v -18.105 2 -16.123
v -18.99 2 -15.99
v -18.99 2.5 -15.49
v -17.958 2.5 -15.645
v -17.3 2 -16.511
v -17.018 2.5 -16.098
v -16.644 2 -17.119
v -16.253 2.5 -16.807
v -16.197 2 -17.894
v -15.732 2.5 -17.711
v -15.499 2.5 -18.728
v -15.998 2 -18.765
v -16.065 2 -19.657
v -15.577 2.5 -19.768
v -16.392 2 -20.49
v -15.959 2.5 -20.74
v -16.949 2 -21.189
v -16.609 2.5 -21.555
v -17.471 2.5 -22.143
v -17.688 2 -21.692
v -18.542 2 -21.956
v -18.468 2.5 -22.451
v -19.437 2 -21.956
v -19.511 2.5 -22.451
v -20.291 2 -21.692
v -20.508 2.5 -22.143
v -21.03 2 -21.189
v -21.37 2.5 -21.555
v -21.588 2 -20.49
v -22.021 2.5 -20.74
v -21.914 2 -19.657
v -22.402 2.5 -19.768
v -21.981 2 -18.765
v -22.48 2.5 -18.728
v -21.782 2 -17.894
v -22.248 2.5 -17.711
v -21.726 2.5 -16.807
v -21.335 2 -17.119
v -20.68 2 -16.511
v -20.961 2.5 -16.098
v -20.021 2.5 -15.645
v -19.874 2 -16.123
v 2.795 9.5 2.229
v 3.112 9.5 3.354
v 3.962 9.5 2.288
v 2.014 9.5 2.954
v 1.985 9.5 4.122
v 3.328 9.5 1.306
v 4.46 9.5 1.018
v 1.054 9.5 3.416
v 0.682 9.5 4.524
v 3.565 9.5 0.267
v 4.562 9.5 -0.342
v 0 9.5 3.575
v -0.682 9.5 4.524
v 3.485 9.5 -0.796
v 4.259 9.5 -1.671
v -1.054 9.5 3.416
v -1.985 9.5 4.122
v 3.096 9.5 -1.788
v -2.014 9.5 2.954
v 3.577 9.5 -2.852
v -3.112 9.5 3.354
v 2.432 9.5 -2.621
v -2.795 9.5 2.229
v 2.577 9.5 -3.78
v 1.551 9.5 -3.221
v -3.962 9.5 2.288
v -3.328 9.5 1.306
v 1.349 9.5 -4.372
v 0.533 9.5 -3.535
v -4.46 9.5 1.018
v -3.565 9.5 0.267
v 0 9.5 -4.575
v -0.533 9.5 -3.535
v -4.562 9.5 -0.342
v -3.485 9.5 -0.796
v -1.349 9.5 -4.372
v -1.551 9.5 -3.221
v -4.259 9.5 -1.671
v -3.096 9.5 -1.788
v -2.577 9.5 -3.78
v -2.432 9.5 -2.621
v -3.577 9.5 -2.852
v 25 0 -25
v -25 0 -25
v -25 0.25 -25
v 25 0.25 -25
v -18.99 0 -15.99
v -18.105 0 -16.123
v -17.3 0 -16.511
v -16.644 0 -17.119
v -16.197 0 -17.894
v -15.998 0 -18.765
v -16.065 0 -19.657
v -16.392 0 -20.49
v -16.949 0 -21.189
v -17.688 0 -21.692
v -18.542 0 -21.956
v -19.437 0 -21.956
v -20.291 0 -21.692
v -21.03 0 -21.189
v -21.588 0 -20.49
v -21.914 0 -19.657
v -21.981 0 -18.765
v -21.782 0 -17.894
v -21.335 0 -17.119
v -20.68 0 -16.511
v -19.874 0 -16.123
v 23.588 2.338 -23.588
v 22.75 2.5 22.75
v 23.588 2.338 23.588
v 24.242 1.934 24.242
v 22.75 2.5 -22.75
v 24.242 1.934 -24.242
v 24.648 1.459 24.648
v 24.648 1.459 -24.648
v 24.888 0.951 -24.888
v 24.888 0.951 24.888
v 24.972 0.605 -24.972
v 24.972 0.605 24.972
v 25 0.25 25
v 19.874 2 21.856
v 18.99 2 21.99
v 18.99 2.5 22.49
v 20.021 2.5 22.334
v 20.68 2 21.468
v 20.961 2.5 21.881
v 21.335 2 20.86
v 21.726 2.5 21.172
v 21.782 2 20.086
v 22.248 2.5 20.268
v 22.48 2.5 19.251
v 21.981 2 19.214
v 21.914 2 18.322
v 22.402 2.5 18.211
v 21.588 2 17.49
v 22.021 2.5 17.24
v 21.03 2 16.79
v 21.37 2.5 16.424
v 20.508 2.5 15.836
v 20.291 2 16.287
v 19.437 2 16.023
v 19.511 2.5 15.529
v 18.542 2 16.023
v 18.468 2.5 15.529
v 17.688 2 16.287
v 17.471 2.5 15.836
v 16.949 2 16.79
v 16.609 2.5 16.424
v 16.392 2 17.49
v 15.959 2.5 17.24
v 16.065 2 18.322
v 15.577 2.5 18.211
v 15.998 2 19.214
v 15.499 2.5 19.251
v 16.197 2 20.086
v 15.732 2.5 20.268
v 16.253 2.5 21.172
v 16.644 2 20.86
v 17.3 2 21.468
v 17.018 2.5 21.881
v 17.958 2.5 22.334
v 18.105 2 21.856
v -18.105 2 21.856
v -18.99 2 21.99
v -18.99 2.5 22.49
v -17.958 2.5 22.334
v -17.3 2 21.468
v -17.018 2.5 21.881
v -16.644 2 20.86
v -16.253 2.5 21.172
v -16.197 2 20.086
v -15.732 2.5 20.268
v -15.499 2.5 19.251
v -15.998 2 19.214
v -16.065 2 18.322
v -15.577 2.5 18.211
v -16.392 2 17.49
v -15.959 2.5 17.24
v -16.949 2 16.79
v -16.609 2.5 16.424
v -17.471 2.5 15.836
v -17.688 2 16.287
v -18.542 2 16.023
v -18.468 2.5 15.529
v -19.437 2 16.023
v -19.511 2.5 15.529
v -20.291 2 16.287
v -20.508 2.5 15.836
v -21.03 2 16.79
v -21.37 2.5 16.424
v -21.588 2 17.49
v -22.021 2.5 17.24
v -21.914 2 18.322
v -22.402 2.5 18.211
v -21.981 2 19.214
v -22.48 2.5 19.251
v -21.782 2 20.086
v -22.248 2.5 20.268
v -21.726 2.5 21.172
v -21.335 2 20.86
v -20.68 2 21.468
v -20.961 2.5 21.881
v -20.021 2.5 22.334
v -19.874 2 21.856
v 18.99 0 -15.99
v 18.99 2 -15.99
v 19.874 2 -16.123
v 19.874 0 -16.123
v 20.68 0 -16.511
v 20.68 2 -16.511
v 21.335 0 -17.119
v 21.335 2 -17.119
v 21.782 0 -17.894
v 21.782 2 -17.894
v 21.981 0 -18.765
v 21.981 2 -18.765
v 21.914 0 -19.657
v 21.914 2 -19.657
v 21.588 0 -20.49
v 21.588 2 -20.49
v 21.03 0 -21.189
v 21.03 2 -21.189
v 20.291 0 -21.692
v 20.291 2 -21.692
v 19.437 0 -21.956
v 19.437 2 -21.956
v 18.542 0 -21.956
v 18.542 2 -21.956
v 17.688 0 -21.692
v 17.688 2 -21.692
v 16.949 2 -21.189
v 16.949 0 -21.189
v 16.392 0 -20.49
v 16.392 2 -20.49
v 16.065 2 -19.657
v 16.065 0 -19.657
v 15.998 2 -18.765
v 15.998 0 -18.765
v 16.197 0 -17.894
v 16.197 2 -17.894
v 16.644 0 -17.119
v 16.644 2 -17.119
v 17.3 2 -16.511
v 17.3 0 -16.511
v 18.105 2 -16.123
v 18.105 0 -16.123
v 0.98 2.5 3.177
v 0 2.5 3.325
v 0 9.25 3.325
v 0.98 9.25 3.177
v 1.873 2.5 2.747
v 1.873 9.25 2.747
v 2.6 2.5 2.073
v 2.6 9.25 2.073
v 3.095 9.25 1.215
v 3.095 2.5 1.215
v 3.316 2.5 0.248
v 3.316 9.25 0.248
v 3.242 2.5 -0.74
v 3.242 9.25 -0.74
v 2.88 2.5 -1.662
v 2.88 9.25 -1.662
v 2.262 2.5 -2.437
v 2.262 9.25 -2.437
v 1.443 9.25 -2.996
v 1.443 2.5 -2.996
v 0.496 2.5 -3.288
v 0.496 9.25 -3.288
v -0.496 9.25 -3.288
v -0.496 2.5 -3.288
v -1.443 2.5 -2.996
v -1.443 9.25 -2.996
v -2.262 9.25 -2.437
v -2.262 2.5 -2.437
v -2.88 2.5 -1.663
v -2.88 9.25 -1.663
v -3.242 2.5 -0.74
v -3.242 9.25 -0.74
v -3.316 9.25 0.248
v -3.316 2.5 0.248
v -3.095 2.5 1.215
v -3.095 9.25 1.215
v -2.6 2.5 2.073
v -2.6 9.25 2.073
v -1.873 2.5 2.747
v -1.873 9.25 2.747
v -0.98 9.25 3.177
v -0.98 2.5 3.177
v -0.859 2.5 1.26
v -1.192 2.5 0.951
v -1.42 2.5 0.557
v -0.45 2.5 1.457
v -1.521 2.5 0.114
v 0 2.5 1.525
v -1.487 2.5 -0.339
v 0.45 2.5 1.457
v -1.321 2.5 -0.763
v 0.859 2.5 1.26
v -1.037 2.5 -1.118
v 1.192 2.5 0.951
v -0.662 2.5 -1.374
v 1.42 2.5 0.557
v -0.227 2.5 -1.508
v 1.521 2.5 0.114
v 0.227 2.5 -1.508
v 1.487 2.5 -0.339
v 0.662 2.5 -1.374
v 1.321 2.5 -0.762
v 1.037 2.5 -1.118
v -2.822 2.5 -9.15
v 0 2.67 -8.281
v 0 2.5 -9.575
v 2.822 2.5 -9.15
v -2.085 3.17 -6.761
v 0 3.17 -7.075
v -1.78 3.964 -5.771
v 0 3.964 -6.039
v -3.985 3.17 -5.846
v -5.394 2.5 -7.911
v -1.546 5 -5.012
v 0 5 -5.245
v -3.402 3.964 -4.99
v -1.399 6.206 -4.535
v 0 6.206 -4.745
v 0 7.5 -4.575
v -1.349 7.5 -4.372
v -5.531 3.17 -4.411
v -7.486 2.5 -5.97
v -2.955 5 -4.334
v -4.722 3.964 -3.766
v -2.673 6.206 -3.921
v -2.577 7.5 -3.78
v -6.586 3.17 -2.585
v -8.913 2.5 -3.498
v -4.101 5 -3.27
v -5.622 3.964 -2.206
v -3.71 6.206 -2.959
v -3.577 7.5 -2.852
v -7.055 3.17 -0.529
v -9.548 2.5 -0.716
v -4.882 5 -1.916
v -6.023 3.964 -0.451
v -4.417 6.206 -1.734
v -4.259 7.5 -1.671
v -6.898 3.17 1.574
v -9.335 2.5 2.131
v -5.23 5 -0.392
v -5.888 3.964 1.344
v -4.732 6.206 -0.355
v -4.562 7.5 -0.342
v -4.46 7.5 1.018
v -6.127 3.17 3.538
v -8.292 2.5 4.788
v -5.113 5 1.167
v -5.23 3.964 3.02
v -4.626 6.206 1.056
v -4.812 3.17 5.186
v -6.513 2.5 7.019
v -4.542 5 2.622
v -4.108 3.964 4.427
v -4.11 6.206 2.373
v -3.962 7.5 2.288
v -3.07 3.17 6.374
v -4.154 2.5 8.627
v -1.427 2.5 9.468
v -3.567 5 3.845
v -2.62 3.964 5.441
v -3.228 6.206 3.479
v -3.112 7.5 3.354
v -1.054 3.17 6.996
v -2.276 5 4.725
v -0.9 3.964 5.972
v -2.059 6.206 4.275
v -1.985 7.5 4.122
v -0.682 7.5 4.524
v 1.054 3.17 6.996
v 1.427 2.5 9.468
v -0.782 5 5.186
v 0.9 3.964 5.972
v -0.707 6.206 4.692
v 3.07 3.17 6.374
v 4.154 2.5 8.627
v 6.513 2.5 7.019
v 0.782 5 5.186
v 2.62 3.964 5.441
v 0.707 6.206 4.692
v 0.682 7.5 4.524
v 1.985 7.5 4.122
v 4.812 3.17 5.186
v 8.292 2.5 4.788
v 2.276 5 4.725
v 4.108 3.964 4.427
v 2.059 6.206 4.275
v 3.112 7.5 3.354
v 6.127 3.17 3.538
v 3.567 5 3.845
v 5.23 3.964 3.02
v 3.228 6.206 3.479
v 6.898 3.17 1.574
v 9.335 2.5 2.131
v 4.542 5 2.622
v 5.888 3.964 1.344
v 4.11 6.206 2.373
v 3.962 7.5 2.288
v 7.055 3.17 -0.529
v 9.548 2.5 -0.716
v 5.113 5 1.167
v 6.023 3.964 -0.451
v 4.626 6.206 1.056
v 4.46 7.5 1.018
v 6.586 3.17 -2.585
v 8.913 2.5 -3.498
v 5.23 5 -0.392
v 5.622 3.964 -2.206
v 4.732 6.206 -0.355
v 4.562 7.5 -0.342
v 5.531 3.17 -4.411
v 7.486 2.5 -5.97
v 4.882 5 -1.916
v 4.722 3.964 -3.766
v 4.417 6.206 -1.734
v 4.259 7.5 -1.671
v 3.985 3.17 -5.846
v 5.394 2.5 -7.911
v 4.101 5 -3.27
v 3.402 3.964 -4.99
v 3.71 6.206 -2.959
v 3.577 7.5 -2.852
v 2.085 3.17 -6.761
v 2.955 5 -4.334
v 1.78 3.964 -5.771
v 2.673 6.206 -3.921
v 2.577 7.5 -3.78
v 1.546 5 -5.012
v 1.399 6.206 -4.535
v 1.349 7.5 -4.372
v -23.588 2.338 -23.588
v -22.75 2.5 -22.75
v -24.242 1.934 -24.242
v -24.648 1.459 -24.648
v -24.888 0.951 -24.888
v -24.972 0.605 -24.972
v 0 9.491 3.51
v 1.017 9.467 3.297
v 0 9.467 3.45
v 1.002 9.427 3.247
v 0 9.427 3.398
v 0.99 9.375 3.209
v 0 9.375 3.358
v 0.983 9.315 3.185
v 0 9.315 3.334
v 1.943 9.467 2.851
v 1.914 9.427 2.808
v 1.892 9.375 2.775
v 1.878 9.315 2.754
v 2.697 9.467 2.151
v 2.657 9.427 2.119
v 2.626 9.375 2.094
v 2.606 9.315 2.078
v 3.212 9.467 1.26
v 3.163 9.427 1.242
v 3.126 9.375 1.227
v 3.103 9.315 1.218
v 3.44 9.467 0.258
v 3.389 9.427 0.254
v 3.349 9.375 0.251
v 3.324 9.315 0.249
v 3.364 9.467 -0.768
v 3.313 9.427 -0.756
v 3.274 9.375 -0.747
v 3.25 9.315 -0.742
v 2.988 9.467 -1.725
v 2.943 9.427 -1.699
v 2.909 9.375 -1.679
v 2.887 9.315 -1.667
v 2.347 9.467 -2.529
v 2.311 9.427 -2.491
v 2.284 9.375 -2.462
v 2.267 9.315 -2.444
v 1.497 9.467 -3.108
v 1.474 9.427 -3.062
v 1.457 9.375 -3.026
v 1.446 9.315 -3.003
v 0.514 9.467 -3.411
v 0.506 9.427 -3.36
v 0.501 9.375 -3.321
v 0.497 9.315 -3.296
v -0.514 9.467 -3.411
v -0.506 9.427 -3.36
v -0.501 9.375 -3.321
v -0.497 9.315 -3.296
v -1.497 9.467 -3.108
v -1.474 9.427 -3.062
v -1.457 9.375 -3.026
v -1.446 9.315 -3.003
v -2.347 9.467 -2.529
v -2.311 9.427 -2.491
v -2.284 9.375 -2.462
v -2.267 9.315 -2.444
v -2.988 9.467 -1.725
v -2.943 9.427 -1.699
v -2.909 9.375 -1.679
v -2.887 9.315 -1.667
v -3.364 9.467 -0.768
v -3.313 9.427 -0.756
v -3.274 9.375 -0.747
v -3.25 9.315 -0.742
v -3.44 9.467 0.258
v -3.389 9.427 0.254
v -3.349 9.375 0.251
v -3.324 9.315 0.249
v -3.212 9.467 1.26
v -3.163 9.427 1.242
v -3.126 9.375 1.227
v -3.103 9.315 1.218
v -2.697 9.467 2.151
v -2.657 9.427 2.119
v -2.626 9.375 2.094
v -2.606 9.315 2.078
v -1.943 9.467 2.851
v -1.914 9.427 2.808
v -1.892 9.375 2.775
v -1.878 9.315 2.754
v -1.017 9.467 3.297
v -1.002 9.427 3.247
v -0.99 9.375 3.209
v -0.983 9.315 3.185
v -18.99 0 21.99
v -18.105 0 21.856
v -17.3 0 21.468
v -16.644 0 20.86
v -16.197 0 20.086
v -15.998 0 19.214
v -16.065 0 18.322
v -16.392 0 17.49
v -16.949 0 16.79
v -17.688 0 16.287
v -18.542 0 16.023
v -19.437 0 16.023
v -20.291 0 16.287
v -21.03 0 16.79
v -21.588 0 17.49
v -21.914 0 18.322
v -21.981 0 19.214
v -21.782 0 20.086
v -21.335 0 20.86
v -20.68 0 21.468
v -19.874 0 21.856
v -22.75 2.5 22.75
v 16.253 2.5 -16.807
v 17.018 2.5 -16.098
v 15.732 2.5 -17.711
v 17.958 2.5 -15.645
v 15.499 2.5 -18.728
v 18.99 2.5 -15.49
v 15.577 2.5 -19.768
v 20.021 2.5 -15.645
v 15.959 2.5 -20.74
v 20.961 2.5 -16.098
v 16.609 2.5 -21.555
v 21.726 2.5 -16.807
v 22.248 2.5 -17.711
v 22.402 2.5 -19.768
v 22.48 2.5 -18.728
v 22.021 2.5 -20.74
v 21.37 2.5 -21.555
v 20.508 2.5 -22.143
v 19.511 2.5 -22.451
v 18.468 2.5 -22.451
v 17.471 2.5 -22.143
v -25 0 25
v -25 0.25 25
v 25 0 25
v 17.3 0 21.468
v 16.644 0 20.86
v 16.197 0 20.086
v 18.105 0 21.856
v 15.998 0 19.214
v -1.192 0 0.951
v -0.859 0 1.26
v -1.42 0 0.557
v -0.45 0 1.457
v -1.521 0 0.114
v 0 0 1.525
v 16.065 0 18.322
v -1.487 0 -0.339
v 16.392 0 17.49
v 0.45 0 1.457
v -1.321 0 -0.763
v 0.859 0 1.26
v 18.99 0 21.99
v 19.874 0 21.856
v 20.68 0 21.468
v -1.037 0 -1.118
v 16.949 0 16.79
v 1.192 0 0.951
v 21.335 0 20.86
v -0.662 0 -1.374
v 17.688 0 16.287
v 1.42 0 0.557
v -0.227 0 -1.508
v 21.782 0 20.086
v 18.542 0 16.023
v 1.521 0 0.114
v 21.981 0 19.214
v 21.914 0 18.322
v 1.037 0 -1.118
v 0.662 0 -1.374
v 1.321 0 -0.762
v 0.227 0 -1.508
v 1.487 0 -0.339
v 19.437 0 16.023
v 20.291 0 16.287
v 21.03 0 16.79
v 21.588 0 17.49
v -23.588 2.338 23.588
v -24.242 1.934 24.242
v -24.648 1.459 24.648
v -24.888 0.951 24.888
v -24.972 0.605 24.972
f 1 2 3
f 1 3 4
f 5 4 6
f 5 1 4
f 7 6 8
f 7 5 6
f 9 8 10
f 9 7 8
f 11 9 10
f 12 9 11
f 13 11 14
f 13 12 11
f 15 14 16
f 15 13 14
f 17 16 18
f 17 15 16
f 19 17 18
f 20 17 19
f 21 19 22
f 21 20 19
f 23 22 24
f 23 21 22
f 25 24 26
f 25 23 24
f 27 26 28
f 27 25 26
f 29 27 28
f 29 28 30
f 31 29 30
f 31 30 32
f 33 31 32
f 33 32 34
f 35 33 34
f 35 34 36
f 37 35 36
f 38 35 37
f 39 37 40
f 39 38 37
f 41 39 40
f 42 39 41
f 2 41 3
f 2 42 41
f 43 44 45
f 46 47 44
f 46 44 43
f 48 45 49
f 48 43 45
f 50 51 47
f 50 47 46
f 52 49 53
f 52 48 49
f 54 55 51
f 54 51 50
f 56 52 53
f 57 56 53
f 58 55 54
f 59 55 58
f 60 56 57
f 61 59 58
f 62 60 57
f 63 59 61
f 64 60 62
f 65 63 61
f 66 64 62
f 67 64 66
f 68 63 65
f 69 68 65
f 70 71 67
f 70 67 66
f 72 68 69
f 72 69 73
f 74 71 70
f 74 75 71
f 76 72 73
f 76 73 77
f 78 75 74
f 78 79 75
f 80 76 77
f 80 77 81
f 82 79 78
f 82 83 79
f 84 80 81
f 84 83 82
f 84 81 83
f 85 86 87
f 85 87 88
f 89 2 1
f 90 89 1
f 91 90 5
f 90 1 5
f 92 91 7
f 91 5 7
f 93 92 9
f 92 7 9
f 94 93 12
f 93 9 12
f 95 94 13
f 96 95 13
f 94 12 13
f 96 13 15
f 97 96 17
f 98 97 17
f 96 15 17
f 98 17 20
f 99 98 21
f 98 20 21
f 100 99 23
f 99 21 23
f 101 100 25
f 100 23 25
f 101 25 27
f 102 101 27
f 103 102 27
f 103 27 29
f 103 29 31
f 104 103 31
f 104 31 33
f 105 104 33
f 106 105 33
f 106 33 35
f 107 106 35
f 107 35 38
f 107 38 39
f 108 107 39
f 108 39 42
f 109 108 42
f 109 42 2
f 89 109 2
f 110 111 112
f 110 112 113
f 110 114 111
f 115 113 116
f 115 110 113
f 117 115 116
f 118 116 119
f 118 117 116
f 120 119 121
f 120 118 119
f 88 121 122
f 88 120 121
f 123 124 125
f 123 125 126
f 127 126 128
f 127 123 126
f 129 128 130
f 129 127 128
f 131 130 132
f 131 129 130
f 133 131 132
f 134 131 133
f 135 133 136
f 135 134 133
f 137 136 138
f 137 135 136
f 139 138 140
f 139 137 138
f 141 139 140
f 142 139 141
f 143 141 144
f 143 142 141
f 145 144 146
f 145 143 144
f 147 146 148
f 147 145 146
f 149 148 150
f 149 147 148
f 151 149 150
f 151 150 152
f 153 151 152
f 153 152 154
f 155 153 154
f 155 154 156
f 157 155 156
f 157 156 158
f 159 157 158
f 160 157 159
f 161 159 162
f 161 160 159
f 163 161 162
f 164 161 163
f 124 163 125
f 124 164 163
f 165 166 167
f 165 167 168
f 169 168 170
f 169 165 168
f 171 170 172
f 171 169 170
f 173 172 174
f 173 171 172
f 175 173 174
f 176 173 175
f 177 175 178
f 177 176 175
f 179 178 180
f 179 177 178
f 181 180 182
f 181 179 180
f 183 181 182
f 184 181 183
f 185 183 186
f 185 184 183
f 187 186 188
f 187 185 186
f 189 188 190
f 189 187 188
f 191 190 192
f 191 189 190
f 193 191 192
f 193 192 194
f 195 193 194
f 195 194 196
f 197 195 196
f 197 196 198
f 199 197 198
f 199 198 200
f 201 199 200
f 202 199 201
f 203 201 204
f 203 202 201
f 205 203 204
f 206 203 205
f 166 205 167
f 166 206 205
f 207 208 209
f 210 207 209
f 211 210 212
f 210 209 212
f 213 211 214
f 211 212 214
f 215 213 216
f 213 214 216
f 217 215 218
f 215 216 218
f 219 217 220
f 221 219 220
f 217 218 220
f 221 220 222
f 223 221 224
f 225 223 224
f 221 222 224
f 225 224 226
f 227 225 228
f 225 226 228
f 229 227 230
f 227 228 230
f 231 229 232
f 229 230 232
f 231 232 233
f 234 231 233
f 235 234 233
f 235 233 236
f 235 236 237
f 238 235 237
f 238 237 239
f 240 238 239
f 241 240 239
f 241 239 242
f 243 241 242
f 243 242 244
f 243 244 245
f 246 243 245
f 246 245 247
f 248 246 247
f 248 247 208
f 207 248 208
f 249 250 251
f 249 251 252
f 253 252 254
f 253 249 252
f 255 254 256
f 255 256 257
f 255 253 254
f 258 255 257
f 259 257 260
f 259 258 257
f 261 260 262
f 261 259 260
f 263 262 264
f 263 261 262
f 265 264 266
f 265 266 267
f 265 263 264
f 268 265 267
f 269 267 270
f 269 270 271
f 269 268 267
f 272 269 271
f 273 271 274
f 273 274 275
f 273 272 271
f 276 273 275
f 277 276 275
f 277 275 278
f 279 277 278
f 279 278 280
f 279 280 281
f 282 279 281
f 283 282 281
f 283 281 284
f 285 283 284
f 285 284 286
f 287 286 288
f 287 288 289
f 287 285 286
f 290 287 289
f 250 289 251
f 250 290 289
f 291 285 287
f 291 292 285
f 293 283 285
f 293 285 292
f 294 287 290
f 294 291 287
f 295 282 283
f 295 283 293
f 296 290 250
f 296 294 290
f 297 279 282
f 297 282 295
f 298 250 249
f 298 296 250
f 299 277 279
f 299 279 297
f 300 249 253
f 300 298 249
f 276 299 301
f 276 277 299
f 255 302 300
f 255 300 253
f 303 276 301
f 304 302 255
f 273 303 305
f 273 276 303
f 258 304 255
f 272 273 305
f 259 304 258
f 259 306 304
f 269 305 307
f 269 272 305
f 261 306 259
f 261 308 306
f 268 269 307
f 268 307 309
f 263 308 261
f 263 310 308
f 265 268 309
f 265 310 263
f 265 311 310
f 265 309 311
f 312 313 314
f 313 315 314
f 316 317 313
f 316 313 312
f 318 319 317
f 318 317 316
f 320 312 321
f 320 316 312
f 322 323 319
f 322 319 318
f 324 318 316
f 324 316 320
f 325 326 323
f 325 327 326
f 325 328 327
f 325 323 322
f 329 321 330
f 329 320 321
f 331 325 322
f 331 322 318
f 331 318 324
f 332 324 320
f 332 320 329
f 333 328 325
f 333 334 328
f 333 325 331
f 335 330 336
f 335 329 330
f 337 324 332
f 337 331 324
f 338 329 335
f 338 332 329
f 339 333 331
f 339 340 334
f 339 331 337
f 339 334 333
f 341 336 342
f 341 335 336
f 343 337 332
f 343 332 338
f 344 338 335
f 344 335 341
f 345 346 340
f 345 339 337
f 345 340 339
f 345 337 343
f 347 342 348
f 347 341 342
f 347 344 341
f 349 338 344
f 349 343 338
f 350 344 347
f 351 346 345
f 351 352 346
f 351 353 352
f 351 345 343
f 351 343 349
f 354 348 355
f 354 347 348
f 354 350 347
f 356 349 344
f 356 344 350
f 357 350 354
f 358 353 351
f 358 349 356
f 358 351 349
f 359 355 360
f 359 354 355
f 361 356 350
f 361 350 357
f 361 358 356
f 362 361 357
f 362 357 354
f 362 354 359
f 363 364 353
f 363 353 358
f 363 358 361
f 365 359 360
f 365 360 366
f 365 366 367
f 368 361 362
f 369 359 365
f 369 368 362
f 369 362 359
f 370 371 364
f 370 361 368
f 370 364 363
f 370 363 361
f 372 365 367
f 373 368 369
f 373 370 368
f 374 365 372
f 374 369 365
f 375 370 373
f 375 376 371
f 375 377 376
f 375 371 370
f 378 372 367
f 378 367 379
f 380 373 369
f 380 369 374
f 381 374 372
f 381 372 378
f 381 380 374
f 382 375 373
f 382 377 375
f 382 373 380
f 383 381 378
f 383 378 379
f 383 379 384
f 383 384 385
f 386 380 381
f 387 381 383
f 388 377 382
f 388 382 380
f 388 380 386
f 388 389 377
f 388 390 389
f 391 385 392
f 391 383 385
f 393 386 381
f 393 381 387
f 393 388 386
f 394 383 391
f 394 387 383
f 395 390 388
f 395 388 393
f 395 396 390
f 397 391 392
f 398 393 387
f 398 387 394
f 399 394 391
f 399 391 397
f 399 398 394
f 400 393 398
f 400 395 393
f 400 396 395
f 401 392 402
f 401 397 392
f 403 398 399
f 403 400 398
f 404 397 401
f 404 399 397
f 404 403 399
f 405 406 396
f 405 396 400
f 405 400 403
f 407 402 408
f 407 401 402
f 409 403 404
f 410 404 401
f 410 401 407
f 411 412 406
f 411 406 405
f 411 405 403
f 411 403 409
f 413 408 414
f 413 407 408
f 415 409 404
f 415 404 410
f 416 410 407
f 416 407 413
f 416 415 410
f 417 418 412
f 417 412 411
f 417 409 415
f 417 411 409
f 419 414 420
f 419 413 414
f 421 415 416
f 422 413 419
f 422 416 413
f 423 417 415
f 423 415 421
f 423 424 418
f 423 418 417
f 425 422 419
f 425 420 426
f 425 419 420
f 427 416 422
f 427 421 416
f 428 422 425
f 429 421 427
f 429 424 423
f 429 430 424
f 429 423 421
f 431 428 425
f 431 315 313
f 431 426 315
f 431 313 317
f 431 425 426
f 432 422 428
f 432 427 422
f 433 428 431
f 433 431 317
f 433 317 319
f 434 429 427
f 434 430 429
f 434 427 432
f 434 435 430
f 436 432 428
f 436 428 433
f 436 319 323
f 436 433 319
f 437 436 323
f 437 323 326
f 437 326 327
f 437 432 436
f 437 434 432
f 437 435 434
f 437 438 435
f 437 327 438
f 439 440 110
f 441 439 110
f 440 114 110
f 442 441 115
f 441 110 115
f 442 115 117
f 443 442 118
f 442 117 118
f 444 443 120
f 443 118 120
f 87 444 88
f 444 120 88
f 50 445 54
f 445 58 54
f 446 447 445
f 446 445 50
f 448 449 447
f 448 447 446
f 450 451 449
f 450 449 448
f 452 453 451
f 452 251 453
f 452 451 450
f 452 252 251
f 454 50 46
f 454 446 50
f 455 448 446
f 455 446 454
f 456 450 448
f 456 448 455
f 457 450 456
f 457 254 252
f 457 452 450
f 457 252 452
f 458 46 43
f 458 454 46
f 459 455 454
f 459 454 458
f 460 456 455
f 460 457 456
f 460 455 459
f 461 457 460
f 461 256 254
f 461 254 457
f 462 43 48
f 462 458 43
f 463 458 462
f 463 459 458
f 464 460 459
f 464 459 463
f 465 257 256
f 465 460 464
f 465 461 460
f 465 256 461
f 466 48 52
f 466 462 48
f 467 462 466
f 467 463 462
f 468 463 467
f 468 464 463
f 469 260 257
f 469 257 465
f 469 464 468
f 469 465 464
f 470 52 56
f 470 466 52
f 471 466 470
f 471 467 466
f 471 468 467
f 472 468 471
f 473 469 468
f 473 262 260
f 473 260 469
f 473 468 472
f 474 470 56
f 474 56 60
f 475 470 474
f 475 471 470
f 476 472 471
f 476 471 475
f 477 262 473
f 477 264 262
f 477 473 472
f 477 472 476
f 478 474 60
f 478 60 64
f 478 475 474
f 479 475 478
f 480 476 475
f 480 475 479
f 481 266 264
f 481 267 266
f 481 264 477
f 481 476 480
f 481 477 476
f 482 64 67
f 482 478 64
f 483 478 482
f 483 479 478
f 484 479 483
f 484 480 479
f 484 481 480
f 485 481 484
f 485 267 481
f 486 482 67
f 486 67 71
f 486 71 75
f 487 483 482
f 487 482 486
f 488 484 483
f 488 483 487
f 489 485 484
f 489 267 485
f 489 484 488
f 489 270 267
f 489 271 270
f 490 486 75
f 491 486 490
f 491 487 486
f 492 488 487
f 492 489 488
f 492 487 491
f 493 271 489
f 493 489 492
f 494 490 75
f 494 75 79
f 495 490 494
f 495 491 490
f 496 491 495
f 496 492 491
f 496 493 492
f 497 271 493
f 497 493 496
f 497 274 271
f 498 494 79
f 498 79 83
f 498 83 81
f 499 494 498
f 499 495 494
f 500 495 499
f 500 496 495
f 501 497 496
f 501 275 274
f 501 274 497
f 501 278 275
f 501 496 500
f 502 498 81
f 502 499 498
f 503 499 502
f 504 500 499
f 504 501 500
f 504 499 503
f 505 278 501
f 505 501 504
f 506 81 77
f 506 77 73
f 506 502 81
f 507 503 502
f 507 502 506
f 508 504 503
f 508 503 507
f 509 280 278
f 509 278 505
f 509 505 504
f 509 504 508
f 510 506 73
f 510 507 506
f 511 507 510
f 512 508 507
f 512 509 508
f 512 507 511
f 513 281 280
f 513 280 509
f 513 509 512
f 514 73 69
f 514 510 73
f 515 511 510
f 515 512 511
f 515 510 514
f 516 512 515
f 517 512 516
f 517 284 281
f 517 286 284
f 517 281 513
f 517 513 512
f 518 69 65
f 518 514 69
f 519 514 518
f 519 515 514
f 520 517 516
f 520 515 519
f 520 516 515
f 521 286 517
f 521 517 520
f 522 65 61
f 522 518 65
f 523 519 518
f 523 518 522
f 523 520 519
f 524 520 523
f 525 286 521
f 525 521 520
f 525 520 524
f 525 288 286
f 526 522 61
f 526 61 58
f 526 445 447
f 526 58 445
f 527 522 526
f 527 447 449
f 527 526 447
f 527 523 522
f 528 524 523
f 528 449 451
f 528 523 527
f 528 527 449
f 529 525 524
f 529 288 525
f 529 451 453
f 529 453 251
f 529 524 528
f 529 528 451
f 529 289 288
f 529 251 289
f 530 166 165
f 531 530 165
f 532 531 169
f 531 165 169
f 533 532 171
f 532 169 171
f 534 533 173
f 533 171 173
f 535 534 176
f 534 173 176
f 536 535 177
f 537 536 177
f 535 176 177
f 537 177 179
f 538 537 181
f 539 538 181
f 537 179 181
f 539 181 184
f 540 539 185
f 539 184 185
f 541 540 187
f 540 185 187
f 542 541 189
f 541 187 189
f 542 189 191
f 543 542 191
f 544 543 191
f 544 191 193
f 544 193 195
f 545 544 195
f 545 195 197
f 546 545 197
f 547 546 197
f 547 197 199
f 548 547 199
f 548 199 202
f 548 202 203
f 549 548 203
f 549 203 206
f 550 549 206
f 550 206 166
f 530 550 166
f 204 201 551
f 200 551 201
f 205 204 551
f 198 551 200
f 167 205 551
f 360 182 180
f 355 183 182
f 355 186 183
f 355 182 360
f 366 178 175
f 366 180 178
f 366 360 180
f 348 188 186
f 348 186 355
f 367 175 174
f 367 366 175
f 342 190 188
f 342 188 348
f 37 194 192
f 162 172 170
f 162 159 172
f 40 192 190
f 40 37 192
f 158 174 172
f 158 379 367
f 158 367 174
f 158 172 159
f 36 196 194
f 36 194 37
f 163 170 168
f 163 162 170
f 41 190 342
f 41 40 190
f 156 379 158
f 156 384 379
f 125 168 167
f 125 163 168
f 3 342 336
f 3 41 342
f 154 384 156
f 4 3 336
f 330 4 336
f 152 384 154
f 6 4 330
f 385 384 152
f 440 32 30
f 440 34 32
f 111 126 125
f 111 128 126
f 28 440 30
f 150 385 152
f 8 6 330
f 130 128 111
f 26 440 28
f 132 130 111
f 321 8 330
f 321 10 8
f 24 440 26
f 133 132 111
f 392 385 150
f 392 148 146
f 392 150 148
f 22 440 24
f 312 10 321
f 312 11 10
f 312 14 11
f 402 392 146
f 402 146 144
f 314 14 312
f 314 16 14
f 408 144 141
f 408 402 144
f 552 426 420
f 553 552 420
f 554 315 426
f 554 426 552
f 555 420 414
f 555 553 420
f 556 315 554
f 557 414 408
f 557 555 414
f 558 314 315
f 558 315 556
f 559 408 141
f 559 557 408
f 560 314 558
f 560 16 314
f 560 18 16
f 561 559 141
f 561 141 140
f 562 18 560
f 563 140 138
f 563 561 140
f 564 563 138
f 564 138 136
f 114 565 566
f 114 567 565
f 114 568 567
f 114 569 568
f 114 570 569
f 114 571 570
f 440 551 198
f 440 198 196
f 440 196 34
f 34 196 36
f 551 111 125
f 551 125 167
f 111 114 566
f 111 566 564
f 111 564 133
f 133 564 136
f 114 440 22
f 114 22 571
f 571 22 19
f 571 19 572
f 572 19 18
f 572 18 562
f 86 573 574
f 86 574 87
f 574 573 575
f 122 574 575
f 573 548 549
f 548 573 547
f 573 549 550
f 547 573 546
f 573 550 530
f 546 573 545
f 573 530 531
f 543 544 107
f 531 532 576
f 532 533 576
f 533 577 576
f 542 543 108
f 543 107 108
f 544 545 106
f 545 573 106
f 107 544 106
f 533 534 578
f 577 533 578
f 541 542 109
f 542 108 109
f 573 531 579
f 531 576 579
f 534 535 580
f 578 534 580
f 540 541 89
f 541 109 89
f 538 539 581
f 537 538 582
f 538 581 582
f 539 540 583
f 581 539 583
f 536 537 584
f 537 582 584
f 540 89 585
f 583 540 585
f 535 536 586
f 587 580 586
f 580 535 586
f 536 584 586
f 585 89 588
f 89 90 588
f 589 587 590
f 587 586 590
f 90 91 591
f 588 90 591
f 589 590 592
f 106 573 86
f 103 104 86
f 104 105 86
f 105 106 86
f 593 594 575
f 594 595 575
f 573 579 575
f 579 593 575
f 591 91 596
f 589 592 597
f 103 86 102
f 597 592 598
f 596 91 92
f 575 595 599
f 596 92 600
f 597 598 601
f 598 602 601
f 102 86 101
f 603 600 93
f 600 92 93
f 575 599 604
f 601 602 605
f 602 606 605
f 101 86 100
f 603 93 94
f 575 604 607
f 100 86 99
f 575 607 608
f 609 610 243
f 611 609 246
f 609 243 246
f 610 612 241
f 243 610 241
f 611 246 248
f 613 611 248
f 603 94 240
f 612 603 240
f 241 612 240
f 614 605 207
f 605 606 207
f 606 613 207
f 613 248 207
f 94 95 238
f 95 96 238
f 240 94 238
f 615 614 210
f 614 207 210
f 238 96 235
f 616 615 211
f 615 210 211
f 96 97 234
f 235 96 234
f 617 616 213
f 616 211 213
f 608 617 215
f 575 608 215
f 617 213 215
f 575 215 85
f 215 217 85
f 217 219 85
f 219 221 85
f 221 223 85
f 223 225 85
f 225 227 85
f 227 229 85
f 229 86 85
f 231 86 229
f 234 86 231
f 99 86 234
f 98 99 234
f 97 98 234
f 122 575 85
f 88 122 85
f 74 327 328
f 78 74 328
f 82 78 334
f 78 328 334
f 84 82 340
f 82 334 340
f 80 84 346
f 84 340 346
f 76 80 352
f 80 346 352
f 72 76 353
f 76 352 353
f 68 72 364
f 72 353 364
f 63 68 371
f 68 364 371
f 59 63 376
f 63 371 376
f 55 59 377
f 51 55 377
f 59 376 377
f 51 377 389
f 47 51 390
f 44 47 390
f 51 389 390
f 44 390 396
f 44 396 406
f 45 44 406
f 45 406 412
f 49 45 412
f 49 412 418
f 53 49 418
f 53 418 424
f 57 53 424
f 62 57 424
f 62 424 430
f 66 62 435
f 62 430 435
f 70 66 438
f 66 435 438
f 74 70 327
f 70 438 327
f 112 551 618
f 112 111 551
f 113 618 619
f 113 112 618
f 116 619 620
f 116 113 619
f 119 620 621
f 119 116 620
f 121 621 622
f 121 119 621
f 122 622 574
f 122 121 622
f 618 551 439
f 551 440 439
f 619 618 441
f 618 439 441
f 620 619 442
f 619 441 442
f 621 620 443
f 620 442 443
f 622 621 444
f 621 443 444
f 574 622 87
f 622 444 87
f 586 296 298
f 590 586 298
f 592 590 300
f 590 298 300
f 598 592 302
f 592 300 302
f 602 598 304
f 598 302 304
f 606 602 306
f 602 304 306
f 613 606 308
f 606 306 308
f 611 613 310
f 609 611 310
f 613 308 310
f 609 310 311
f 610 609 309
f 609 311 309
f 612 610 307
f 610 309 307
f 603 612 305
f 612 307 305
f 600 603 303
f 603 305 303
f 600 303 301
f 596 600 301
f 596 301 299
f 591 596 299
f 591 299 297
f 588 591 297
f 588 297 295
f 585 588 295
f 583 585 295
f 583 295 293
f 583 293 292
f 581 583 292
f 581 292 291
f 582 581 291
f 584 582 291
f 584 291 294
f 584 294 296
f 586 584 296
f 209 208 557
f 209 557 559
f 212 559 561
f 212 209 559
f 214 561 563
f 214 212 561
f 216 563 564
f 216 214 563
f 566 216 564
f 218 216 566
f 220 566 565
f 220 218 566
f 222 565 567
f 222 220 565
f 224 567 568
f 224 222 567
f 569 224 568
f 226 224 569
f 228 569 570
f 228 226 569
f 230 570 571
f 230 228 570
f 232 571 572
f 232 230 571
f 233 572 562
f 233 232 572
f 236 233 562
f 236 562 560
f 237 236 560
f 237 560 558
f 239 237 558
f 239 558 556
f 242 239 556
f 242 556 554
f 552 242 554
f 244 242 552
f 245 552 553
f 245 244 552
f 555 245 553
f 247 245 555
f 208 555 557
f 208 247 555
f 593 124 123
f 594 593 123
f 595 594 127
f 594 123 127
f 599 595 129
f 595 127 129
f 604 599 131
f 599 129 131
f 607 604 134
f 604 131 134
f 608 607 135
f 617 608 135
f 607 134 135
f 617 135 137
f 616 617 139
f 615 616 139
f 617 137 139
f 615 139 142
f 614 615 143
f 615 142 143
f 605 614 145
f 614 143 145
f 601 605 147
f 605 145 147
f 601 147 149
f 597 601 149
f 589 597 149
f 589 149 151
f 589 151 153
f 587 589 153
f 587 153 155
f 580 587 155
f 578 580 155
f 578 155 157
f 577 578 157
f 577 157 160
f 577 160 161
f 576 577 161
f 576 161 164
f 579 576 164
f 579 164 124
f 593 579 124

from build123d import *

# Parameters (mm, degrees)
SKETCH1_W           = 50
SKETCH1_H           = 50
BOSS_EXTRUDE1_DEPTH = 2.5
SKETCH2_R           = 1.525
CUT_EXTRUDE1_DEPTH  = 97.5
SKETCH6_R           = 3
CUT_EXTRUDE2_DEPTH  = 97.5
SKETCH7_R           = 4.575
SKETCH7_R_2         = 3.325
BOSS_EXTRUDE2_DEPTH = 7
FILLET1_R           = 5
FILLET2_R           = 2.25
CHAMFER1_SIZE       = 0.5
FILLET3_R           = 0.25


with BuildPart() as part:
    # Sketch1 → Boss-Extrude1 (new body)
    with BuildSketch(Plane(origin=(0, 0, 0), x_dir=(1, 0, 0), z_dir=(0, 1, 0))):
        Rectangle(SKETCH1_W, SKETCH1_H)
    extrude(amount=BOSS_EXTRUDE1_DEPTH)

    # Sketch2 → Cut-Extrude1 (cut)
    with BuildSketch(Plane(origin=(0, 2.5, 0), x_dir=(1, 0, 0), z_dir=(0, 1, 0))):
        with Locations(Location((0, 0, 0), (0, 0, 270))):
            Circle(SKETCH2_R)
    extrude(amount=-CUT_EXTRUDE1_DEPTH, mode=Mode.SUBTRACT)

    # Sketch6 → Cut-Extrude2 (cut)
    with BuildSketch(Plane(origin=(0, 2.5, 0), x_dir=(1, 0, 0), z_dir=(0, 1, 0))):
        with Locations(Location((-18.98959236, 18.98959236, 0), (0, 0, 270))):
            Circle(SKETCH6_R)
        with Locations(Location((18.98959236, 18.98959236, 0), (0, 0, 270))):
            Circle(SKETCH6_R)
        with Locations(Location((18.98959236, -18.98959236, 0), (0, 0, 270))):
            Circle(SKETCH6_R)
        with Locations(Location((-18.98959236, -18.98959236, 0), (0, 0, 270))):
            Circle(SKETCH6_R)
    extrude(amount=-CUT_EXTRUDE2_DEPTH, mode=Mode.SUBTRACT)

    # Sketch7 → Boss-Extrude2 (add)
    with BuildSketch(Plane(origin=(0, 2.5, 0), x_dir=(1, 0, 0), z_dir=(0, 1, 0))):
        with Locations(Location((0, 0, 0), (0, 0, 90))):
            Circle(SKETCH7_R)
        with Locations(Location((0, 0, 0), (0, 0, 270))):
            Circle(SKETCH7_R_2, mode=Mode.SUBTRACT)
    extrude(amount=BOSS_EXTRUDE2_DEPTH)

    # Fillet1
    fillet1_edges = [part.edges().sort_by_distance(p)[0] for p in [
        (0, 2.5, 4.575),
    ]]
    fillet(fillet1_edges, radius=FILLET1_R)

    # Fillet2
    fillet2_edges = [part.edges().sort_by_distance(p)[0] for p in [
        (-25, 2.5, 0),
        (0, 2.5, 25),
        (25, 2.5, 0),
        (0, 2.5, -25),
    ]]
    fillet(fillet2_edges, radius=FILLET2_R)

    # Chamfer1
    chamfer1_edges = [part.edges().sort_by_distance(p)[0] for p in [
        (-18.98959236, 2.5, 15.98959236),
        (18.98959236, 2.5, 15.98959236),
        (18.98959236, 2.5, -21.98959236),
        (-18.98959236, 2.5, -21.98959236),
    ]]
    chamfer(chamfer1_edges, length=CHAMFER1_SIZE)

    # Fillet3
    fillet3_edges = [part.edges().sort_by_distance(p)[0] for p in [
        (0, 9.5, -3.325),
    ]]
    fillet(fillet3_edges, radius=FILLET3_R)


solid = part.part
